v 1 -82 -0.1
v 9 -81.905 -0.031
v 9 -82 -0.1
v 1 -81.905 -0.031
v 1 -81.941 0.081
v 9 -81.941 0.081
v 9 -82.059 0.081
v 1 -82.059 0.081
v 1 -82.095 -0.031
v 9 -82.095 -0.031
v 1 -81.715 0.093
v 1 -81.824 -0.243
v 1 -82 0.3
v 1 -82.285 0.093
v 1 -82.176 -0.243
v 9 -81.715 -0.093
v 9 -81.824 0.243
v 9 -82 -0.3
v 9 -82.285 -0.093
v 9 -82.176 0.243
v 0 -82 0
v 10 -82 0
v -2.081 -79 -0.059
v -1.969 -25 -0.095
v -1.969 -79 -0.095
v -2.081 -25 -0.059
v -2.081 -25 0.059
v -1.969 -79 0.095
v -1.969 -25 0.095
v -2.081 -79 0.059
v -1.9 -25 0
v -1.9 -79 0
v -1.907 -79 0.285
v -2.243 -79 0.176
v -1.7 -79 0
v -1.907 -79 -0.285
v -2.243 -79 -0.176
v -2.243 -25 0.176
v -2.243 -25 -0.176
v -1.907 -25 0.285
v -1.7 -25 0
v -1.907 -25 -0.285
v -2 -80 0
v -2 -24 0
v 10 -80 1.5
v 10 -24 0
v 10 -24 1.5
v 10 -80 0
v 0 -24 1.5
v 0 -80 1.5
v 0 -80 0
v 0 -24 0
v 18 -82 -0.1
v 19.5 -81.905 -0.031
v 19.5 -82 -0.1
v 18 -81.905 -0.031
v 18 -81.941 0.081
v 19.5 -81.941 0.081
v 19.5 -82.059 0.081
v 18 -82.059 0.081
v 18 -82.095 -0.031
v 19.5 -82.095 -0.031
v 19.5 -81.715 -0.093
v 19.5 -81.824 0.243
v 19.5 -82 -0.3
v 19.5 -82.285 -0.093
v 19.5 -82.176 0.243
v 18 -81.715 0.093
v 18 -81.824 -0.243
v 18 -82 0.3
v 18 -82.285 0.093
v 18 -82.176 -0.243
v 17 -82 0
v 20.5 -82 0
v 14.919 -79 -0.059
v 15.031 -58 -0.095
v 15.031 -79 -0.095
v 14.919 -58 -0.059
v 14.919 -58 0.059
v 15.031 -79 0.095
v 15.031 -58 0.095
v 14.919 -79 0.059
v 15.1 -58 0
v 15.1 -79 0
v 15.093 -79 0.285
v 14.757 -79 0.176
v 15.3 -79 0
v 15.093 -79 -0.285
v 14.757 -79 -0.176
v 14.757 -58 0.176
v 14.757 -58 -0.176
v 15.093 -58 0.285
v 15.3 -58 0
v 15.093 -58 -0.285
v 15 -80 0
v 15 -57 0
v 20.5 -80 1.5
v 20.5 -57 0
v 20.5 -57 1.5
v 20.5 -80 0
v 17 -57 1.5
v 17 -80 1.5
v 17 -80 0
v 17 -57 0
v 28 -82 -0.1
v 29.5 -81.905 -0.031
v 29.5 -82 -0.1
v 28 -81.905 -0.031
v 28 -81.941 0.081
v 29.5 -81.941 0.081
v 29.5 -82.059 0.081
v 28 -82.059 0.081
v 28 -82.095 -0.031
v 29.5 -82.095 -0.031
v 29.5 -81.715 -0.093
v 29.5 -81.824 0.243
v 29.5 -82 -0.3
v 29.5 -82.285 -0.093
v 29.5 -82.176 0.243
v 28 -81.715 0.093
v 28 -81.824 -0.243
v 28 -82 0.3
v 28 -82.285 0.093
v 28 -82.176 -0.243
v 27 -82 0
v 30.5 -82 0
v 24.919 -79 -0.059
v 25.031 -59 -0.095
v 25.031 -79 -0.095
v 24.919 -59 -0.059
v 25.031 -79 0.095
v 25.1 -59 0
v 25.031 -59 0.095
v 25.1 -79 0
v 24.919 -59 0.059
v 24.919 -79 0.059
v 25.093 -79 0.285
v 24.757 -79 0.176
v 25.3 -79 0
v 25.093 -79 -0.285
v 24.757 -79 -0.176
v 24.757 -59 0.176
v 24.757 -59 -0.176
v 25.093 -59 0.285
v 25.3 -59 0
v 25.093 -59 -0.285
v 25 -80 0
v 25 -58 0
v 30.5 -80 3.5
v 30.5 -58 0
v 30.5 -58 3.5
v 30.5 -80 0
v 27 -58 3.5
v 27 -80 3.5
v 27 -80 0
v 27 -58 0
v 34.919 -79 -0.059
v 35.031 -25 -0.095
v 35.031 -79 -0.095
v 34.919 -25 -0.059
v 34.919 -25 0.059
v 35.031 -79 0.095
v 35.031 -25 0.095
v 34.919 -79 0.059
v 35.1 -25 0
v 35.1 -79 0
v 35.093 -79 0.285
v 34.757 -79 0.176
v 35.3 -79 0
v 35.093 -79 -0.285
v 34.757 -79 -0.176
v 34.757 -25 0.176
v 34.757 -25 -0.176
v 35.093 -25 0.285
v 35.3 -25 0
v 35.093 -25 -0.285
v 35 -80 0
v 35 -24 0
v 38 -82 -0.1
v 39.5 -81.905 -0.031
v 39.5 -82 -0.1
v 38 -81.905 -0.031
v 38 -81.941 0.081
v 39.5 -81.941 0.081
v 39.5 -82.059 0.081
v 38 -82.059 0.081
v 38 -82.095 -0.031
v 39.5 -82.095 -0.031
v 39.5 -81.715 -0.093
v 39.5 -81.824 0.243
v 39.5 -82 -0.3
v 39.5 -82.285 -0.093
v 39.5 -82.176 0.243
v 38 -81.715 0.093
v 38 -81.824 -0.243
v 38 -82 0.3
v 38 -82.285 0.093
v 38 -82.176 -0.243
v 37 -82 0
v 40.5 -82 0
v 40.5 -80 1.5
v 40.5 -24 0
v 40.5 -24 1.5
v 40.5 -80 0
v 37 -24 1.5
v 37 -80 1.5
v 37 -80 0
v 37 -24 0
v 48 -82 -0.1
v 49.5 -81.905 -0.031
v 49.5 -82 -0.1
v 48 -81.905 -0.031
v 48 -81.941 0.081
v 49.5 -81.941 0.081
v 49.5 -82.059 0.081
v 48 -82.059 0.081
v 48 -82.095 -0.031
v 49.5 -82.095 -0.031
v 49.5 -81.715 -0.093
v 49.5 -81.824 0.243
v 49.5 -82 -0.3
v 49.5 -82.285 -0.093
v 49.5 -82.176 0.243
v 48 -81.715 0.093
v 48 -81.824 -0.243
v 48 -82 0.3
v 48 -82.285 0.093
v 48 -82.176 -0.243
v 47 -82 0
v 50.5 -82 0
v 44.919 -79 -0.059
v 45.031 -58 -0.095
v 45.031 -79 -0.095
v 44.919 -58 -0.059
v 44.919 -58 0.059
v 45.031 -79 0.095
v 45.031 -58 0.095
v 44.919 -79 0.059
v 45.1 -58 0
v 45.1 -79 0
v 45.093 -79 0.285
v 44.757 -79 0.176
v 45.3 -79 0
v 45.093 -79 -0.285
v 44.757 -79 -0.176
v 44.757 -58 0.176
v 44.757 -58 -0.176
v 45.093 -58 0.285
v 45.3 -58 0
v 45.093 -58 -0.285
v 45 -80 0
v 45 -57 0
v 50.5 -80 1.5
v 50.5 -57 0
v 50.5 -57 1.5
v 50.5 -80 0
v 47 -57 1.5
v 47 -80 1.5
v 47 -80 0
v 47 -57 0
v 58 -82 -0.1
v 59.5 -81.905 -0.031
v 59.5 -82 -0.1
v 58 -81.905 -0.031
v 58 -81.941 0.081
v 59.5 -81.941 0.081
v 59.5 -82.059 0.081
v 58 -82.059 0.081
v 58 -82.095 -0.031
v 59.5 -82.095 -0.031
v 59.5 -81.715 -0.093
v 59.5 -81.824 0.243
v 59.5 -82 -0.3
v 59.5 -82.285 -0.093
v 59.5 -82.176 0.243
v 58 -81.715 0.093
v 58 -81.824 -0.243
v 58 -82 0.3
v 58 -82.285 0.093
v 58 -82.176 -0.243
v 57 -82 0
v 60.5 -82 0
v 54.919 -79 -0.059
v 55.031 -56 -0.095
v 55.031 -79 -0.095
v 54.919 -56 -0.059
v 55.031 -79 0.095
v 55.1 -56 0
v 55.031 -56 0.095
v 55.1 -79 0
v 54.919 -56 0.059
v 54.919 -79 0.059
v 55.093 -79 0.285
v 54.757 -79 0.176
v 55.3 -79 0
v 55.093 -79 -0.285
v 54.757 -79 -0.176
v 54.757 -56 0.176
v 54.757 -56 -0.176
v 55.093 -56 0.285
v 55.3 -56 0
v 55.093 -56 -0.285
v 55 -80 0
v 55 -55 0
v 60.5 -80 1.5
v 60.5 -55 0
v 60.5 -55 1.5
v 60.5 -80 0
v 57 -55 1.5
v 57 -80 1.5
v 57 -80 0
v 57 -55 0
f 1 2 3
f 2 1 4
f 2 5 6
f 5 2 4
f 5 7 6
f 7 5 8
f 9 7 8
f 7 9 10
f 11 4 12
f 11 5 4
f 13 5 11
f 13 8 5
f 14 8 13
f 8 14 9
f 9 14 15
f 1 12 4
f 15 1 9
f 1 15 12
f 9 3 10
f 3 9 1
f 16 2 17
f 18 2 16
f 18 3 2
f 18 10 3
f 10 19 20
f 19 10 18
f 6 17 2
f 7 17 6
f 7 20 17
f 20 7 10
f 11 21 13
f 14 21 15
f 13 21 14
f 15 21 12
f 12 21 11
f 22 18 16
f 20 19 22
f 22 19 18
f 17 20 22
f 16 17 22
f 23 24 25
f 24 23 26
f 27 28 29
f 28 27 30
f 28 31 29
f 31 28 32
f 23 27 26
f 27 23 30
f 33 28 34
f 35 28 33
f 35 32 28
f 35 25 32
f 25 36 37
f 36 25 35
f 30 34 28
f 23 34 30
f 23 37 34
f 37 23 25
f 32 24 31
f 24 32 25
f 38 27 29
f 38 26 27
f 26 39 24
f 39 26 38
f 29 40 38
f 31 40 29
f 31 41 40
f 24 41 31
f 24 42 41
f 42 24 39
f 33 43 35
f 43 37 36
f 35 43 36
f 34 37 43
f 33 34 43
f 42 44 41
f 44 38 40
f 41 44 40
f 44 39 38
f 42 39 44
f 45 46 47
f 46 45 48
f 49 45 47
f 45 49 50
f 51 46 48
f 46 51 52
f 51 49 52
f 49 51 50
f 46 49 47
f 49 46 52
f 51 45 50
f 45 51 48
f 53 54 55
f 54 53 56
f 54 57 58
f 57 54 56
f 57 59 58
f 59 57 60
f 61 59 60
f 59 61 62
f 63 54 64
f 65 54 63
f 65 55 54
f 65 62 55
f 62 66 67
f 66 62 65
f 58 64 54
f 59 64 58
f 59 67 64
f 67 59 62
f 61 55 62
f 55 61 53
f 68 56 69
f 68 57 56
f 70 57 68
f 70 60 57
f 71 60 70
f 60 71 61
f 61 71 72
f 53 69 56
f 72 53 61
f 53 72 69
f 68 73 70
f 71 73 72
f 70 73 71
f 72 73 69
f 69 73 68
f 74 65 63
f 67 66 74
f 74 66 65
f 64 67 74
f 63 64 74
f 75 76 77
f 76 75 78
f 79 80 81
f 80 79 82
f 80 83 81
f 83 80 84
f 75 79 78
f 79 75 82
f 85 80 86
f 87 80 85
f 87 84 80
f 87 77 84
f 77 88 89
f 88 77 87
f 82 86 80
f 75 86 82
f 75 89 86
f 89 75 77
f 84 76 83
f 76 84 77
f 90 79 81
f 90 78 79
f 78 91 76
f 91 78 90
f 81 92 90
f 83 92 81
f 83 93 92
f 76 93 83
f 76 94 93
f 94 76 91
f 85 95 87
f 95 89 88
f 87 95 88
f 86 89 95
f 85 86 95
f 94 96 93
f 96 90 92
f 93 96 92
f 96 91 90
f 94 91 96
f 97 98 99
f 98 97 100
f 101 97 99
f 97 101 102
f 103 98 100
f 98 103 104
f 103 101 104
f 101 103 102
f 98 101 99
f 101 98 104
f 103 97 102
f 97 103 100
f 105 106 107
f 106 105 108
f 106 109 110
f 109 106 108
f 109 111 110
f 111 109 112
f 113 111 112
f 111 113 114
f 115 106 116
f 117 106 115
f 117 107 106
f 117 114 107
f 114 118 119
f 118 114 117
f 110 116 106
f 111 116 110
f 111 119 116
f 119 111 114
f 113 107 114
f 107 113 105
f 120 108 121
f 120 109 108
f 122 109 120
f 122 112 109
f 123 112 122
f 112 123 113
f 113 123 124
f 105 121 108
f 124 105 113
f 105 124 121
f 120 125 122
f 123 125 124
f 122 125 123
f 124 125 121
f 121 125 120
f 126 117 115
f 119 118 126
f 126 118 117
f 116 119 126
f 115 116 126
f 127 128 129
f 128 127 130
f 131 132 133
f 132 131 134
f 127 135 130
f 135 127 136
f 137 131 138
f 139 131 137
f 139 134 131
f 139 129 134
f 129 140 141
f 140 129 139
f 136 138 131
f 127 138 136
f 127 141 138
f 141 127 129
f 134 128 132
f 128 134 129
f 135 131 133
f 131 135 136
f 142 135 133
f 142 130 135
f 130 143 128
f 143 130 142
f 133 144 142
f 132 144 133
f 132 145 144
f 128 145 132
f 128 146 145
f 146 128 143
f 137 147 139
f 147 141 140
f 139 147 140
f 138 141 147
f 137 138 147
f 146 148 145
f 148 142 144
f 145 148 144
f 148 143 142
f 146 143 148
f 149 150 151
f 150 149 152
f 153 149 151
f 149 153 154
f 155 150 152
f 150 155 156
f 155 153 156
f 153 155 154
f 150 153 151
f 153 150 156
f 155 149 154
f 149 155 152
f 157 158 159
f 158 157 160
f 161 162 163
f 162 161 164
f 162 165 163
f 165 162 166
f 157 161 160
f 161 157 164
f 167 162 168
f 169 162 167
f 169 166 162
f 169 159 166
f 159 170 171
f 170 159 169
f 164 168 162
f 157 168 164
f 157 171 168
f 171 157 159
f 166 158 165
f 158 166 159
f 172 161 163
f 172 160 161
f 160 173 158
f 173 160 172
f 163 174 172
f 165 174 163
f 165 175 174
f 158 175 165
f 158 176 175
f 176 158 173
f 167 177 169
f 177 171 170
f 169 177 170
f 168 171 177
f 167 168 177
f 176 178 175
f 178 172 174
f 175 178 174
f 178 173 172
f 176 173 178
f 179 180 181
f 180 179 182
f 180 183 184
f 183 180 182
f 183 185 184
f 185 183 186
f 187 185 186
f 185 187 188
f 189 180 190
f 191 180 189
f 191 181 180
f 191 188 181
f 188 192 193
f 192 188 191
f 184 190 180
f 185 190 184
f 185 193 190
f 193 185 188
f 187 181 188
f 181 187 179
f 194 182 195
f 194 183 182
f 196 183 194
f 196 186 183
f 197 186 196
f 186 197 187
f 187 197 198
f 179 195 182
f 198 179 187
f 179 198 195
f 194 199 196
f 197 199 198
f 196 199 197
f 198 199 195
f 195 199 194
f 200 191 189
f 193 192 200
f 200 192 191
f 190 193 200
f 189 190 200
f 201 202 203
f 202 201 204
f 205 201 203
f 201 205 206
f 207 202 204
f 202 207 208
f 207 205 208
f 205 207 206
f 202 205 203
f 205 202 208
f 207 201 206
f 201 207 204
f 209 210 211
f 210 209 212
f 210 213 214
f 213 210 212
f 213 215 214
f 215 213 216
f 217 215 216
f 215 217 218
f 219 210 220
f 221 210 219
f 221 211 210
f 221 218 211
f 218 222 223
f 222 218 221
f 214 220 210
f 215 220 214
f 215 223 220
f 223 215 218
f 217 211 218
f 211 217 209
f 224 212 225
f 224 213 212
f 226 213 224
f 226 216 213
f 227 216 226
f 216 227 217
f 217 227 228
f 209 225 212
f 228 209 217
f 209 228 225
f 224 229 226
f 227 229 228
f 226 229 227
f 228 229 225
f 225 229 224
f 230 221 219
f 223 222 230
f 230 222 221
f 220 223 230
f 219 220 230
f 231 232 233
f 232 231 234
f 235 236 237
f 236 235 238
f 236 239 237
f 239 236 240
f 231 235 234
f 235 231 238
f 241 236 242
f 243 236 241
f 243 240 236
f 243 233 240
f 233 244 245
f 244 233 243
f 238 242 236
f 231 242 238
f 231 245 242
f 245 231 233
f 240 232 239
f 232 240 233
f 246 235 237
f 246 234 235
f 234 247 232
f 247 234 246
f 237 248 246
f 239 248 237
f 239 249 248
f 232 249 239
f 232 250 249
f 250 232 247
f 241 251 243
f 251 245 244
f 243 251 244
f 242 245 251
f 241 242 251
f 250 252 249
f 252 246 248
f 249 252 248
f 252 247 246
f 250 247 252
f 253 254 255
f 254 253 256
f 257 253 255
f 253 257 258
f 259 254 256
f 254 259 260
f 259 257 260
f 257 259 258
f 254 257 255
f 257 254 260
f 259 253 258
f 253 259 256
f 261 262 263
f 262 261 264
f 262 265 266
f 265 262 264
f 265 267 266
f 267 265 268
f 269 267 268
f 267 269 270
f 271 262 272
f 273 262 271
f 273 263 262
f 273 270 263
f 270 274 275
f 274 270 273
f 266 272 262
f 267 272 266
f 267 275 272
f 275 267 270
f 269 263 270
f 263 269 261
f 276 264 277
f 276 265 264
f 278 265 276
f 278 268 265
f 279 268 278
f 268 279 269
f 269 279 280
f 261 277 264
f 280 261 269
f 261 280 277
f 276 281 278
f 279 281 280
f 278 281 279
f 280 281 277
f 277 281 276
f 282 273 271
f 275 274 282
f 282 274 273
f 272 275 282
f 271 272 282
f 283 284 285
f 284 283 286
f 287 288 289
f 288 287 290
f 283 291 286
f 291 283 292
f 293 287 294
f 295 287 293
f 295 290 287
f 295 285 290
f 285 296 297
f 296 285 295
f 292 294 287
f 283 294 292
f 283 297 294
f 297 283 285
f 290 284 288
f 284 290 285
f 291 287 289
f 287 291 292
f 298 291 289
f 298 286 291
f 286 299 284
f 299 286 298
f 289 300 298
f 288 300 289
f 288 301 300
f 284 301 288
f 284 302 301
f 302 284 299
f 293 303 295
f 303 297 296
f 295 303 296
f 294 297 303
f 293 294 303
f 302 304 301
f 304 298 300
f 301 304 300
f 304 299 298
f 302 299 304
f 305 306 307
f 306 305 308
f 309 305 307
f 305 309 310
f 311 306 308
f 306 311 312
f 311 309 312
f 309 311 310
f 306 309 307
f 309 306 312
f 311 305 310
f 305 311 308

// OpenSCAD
// file: ../lib/common.scad
//--------------------------------------------------------------------------------------------------
// Module Prism
//--------------------------------------------------------------------------------------------------
module prism(z, y, x)
{
    rotate([0, 90, 0])
    {
        polyhedron(
                points=[[0,0,0], [x,0,0], [x,y,0], [0,y,0], [0,y,z], [x,y,z]],
                faces=[[0,1,2,3],[5,4,3,2],[0,4,5,1],[0,3,4],[5,2,1]]);
    }
    
}

//--------------------------------------------------------------------------------------------------
// Module Side panel
//--------------------------------------------------------------------------------------------------
module rect_cut(x, y, z, dx, dy)
{
    // Top panel
    translate([0, dy, 0])
    {
        cube([x, y - dy, z]);
    };

    // Left bottom panel
    translate([0, 0, 0])
    {
        cube([dx, dy, z]);
    };

    // Triangle
    translate([dx, 0, 0])
    {
        rotate([0, 0, 0])
        {
            prism(x - dx, dy, -z);
        }
    };
}

//--------------------------------------------------------------------------------------------------
// X dimensional arrow
//--------------------------------------------------------------------------------------------------
module arrow_x(l)
{
    line_w = 0.1;
    arrow_w = 1;
    arrow_h = 0.3;

    // Line
    translate([l / 2, 0, 0])
    {
        rotate([0, 90, 0])
        {
            color([0.4, 0.4, 0.4])
            cylinder(l - arrow_w * 2, line_w, line_w, true);
        }
    }

    // Left arrow
    translate([arrow_w, 0, 0])
    {
        rotate([0, 270, 0])
        {
            color([0.4, 0.4, 0.4])
            cylinder(arrow_w, arrow_h, 0, false);
        }
    }

    // Right arrow
    translate([l - arrow_w, 0, 0])
    {
        rotate([0, 90, 0])
        {
            color([0.4, 0.4, 0.4])
            cylinder(arrow_w, arrow_h, 0, false);
        }
    }

    // Text
    translate([l/3, 0.5, 0])
    {
        color([0.4, 0.4, 0.4])
        text(str(l), size=1);
    }
}

//--------------------------------------------------------------------------------------------------
// Y dimensional arrow
//--------------------------------------------------------------------------------------------------
module arrow_y(l)
{
    line_w = 0.1;
    arrow_w = 1;
    arrow_h = 0.3;

    // Line
    translate([0, l / 2, 0])
    {
        rotate([90, 0, 00])
        {
            color([0.4, 0.4, 0.4])
            cylinder(l - arrow_w * 2, line_w, line_w, true);
        }
    }

    // Left arrow
    translate([0 ,arrow_w, 0])
    {
        rotate([90, 0, 0])
        {
            color([0.4, 0.4, 0.4])
            cylinder(arrow_w, arrow_h, 0, false);
        }
    }

    // Right arrow
    translate([0, l - arrow_w, 0])
    {
        rotate([270, 0, 0])
        {
            color([0.4, 0.4, 0.4])
            cylinder(arrow_w, arrow_h, 0, false);
        }
    }

    // Text
    translate([-0.5, l/3, 0])
    {
        rotate([0 ,0, 90])
        {
            color([0.4, 0.4, 0.4])
            text(str(l), size=1);
        }
    }
}

//--------------------------------------------------------------------------------------------------
// Z dimensional arrow
//--------------------------------------------------------------------------------------------------
module arrow_z(l)
{
    line_w = 0.1;
    arrow_w = 1;
    arrow_h = 0.3;

    // Line
    translate([0, 0, l / 2])
    {
        rotate([0, 0, 0])
        {
            color([0.4, 0.4, 0.4])
            cylinder(l - arrow_w * 2, line_w, line_w, true);
        }
    }

    // Left arrow
    translate([0, 0, arrow_w])
    {
        rotate([0, 180, 0])
        {
            color([0.4, 0.4, 0.4])
            cylinder(arrow_w, arrow_h, 0, false);
        }
    }

    // Right arrow
    translate([0, 0, l - arrow_w])
    {
        rotate([0, 0, 0])
        {
            color([0.4, 0.4, 0.4])
            cylinder(arrow_w, arrow_h, 0, false);
        }
    }

    // Text
    translate([0.5, 0, l/3])
    {
        rotate([90 ,0, 90])
        {
            color([0.4, 0.4, 0.4])
            text(str(l), size=1);
        }
    }
}

//--------------------------------------------------------------------------------------------------
// parallelogram
//--------------------------------------------------------------------------------------------------
module parallelogram(x = 12, y = 12, z = 1, xd = 0)
{
    points = [
        [0, 0, 0 ],        //0
        [x, 0, 0 ],        //1
        [x + xd, y, 0],    //2
        [xd, y, 0 ],       //3
        [0, 0, z ],        //4
        [x, 0, z ],        //5
        [x + xd, y, z ],   //6
        [xd, y, z ]];      //7

    faces = [
        [0,1,2,3],         // bottom
        [4,5,1,0],         // front
        [7,6,5,4],         // top
        [5,6,2,1],         // right
        [6,7,3,2],         // back
        [7,4,0,3]];        // left

    polyhedron(points, faces);
}
// main file
include <../lib/common.scad>

//--------------------------------------------------------------------------------------------------
module top_board()
{
    color([0, 0, 1])
    cube([10, 56, 1.5]);
}

//--------------------------------------------------------------------------------------------------
module top_board_wing()
{
    color([0, 1, 0])
    cube([3.5, 23, 1.5]);
}

//--------------------------------------------------------------------------------------------------
module leg()
{
    color([1, 0, 0])
    cube([3.5, 22, 3.5]);
}

//--------------------------------------------------------------------------------------------------
module support_l()
{
    color([1, 1, 0])
    cube([3.5, 56, 1.5]);
}

//--------------------------------------------------------------------------------------------------
module support_s()
{
    color([0, 1, 1])
    cube([3.5, 23, 1.5]);
}

//--------------------------------------------------------------------------------------------------
module support_m()
{
    color([1, 0, 1])
    cube([3.5, 25, 1.5]);
}



//--------------------------------------------------------------------------------------------------
// Render
//--------------------------------------------------------------------------------------------------
*translate([0, 0, 0])
{
    //----------------------------------------------------------------------------------------------
    // Top board
    //----------------------------------------------------------------------------------------------
    translate([0, 0, 20.5])
    {
        rotate([0, 0, 0])
        {
            top_board();
        }
    };

    translate([10, 0, 20.5])
    {
        rotate([0, 0, 0])
        {
            top_board();
        }
    };

    translate([20, 0, 20.5])
    {
        rotate([0, 0, 0])
        {
            top_board();
        }
    };

    translate([3.5, 0, 20.5])
    {
        rotate([0, 0, -90])
        {
            top_board_wing();
        }
    };

    translate([3.5, 59.5, 20.5])
    {
        rotate([0, 0, -90])
        {
            top_board_wing();
        }
    };

    //----------------------------------------------------------------------------------------------
    // Legs
    //----------------------------------------------------------------------------------------------
    translate([0, 0, 0])
    {
        rotate([90, 0, 0])
        {
            leg();
        }
    };

    translate([26.5, 0, 0])
    {
        rotate([90, 0, 0])
        {
            leg();
        }
    };

    translate([0, 59.5, 0])
    {
        rotate([90, 0, 0])
        {
            leg();
        }
    };

    translate([26.5, 59.5, 0])
    {
        rotate([90, 0, 0])
        {
            leg();
        }
    };

    //----------------------------------------------------------------------------------------------
    // Supports
    //----------------------------------------------------------------------------------------------
    translate([1, 0, 20.5])
    {
        rotate([0, 90, 0])
        {
            support_l();
        }
    };

    translate([27.5, 0, 20.5])
    {
        rotate([0, 90, 0])
        {
            support_l();
        }
    };

    translate([26.5, -2.5, 20.5])
    {
        rotate([0, 90, 90])
        {
            support_s();
        }
    };

    translate([26.5, 57, 20.5])
    {
        rotate([0, 90, 90])
        {
            support_s();
        }
    };

    translate([27.5, 20, 20.5])
    {
        rotate([0, 90, 90])
        {
            support_m();
        }
    };

    translate([27.5, 41, 20.5])
    {
        rotate([0, 90, 90])
        {
            support_m();
        }
    };
}

//--------------------------------------------------------------------------------------------------
// Draw Parts
//--------------------------------------------------------------------------------------------------
translate([0, -80, 0])
{
    translate([0, 0, 0])
    {
        top_board();

        translate([0, -2, 0])
        {
            arrow_x(10);
        };

        translate([-2, 0, 0])
        {
            arrow_y(56);
        };
    };

    translate([17, 0, 0])
    {
        top_board_wing();

        translate([0, -2, 0])
        {
            arrow_x(3.5);
        };

        translate([-2, 0, 0])
        {
            arrow_y(23);
        };
    };

    translate([27, 0, 0])
    {
        leg();

        translate([0, -2, 0])
        {
            arrow_x(3.5);
        };

        translate([-2, 0, 0])
        {
            arrow_y(22);
        };
    };

    translate([37, 0, 0])
    {
        support_l();

        translate([0, -2, 0])
        {
            arrow_x(3.5);
        };

        translate([-2, 0, 0])
        {
            arrow_y(56);
        };
    };

    translate([47, 0, 0])
    {
        support_s();

        translate([0, -2, 0])
        {
            arrow_x(3.5);
        };

        translate([-2, 0, 0])
        {
            arrow_y(23);
        };
    };

    translate([57, 0, 0])
    {
        support_m();

        translate([0, -2, 0])
        {
            arrow_x(3.5);
        };

        translate([-2, 0, 0])
        {
            arrow_y(25);
        };
    };
}
